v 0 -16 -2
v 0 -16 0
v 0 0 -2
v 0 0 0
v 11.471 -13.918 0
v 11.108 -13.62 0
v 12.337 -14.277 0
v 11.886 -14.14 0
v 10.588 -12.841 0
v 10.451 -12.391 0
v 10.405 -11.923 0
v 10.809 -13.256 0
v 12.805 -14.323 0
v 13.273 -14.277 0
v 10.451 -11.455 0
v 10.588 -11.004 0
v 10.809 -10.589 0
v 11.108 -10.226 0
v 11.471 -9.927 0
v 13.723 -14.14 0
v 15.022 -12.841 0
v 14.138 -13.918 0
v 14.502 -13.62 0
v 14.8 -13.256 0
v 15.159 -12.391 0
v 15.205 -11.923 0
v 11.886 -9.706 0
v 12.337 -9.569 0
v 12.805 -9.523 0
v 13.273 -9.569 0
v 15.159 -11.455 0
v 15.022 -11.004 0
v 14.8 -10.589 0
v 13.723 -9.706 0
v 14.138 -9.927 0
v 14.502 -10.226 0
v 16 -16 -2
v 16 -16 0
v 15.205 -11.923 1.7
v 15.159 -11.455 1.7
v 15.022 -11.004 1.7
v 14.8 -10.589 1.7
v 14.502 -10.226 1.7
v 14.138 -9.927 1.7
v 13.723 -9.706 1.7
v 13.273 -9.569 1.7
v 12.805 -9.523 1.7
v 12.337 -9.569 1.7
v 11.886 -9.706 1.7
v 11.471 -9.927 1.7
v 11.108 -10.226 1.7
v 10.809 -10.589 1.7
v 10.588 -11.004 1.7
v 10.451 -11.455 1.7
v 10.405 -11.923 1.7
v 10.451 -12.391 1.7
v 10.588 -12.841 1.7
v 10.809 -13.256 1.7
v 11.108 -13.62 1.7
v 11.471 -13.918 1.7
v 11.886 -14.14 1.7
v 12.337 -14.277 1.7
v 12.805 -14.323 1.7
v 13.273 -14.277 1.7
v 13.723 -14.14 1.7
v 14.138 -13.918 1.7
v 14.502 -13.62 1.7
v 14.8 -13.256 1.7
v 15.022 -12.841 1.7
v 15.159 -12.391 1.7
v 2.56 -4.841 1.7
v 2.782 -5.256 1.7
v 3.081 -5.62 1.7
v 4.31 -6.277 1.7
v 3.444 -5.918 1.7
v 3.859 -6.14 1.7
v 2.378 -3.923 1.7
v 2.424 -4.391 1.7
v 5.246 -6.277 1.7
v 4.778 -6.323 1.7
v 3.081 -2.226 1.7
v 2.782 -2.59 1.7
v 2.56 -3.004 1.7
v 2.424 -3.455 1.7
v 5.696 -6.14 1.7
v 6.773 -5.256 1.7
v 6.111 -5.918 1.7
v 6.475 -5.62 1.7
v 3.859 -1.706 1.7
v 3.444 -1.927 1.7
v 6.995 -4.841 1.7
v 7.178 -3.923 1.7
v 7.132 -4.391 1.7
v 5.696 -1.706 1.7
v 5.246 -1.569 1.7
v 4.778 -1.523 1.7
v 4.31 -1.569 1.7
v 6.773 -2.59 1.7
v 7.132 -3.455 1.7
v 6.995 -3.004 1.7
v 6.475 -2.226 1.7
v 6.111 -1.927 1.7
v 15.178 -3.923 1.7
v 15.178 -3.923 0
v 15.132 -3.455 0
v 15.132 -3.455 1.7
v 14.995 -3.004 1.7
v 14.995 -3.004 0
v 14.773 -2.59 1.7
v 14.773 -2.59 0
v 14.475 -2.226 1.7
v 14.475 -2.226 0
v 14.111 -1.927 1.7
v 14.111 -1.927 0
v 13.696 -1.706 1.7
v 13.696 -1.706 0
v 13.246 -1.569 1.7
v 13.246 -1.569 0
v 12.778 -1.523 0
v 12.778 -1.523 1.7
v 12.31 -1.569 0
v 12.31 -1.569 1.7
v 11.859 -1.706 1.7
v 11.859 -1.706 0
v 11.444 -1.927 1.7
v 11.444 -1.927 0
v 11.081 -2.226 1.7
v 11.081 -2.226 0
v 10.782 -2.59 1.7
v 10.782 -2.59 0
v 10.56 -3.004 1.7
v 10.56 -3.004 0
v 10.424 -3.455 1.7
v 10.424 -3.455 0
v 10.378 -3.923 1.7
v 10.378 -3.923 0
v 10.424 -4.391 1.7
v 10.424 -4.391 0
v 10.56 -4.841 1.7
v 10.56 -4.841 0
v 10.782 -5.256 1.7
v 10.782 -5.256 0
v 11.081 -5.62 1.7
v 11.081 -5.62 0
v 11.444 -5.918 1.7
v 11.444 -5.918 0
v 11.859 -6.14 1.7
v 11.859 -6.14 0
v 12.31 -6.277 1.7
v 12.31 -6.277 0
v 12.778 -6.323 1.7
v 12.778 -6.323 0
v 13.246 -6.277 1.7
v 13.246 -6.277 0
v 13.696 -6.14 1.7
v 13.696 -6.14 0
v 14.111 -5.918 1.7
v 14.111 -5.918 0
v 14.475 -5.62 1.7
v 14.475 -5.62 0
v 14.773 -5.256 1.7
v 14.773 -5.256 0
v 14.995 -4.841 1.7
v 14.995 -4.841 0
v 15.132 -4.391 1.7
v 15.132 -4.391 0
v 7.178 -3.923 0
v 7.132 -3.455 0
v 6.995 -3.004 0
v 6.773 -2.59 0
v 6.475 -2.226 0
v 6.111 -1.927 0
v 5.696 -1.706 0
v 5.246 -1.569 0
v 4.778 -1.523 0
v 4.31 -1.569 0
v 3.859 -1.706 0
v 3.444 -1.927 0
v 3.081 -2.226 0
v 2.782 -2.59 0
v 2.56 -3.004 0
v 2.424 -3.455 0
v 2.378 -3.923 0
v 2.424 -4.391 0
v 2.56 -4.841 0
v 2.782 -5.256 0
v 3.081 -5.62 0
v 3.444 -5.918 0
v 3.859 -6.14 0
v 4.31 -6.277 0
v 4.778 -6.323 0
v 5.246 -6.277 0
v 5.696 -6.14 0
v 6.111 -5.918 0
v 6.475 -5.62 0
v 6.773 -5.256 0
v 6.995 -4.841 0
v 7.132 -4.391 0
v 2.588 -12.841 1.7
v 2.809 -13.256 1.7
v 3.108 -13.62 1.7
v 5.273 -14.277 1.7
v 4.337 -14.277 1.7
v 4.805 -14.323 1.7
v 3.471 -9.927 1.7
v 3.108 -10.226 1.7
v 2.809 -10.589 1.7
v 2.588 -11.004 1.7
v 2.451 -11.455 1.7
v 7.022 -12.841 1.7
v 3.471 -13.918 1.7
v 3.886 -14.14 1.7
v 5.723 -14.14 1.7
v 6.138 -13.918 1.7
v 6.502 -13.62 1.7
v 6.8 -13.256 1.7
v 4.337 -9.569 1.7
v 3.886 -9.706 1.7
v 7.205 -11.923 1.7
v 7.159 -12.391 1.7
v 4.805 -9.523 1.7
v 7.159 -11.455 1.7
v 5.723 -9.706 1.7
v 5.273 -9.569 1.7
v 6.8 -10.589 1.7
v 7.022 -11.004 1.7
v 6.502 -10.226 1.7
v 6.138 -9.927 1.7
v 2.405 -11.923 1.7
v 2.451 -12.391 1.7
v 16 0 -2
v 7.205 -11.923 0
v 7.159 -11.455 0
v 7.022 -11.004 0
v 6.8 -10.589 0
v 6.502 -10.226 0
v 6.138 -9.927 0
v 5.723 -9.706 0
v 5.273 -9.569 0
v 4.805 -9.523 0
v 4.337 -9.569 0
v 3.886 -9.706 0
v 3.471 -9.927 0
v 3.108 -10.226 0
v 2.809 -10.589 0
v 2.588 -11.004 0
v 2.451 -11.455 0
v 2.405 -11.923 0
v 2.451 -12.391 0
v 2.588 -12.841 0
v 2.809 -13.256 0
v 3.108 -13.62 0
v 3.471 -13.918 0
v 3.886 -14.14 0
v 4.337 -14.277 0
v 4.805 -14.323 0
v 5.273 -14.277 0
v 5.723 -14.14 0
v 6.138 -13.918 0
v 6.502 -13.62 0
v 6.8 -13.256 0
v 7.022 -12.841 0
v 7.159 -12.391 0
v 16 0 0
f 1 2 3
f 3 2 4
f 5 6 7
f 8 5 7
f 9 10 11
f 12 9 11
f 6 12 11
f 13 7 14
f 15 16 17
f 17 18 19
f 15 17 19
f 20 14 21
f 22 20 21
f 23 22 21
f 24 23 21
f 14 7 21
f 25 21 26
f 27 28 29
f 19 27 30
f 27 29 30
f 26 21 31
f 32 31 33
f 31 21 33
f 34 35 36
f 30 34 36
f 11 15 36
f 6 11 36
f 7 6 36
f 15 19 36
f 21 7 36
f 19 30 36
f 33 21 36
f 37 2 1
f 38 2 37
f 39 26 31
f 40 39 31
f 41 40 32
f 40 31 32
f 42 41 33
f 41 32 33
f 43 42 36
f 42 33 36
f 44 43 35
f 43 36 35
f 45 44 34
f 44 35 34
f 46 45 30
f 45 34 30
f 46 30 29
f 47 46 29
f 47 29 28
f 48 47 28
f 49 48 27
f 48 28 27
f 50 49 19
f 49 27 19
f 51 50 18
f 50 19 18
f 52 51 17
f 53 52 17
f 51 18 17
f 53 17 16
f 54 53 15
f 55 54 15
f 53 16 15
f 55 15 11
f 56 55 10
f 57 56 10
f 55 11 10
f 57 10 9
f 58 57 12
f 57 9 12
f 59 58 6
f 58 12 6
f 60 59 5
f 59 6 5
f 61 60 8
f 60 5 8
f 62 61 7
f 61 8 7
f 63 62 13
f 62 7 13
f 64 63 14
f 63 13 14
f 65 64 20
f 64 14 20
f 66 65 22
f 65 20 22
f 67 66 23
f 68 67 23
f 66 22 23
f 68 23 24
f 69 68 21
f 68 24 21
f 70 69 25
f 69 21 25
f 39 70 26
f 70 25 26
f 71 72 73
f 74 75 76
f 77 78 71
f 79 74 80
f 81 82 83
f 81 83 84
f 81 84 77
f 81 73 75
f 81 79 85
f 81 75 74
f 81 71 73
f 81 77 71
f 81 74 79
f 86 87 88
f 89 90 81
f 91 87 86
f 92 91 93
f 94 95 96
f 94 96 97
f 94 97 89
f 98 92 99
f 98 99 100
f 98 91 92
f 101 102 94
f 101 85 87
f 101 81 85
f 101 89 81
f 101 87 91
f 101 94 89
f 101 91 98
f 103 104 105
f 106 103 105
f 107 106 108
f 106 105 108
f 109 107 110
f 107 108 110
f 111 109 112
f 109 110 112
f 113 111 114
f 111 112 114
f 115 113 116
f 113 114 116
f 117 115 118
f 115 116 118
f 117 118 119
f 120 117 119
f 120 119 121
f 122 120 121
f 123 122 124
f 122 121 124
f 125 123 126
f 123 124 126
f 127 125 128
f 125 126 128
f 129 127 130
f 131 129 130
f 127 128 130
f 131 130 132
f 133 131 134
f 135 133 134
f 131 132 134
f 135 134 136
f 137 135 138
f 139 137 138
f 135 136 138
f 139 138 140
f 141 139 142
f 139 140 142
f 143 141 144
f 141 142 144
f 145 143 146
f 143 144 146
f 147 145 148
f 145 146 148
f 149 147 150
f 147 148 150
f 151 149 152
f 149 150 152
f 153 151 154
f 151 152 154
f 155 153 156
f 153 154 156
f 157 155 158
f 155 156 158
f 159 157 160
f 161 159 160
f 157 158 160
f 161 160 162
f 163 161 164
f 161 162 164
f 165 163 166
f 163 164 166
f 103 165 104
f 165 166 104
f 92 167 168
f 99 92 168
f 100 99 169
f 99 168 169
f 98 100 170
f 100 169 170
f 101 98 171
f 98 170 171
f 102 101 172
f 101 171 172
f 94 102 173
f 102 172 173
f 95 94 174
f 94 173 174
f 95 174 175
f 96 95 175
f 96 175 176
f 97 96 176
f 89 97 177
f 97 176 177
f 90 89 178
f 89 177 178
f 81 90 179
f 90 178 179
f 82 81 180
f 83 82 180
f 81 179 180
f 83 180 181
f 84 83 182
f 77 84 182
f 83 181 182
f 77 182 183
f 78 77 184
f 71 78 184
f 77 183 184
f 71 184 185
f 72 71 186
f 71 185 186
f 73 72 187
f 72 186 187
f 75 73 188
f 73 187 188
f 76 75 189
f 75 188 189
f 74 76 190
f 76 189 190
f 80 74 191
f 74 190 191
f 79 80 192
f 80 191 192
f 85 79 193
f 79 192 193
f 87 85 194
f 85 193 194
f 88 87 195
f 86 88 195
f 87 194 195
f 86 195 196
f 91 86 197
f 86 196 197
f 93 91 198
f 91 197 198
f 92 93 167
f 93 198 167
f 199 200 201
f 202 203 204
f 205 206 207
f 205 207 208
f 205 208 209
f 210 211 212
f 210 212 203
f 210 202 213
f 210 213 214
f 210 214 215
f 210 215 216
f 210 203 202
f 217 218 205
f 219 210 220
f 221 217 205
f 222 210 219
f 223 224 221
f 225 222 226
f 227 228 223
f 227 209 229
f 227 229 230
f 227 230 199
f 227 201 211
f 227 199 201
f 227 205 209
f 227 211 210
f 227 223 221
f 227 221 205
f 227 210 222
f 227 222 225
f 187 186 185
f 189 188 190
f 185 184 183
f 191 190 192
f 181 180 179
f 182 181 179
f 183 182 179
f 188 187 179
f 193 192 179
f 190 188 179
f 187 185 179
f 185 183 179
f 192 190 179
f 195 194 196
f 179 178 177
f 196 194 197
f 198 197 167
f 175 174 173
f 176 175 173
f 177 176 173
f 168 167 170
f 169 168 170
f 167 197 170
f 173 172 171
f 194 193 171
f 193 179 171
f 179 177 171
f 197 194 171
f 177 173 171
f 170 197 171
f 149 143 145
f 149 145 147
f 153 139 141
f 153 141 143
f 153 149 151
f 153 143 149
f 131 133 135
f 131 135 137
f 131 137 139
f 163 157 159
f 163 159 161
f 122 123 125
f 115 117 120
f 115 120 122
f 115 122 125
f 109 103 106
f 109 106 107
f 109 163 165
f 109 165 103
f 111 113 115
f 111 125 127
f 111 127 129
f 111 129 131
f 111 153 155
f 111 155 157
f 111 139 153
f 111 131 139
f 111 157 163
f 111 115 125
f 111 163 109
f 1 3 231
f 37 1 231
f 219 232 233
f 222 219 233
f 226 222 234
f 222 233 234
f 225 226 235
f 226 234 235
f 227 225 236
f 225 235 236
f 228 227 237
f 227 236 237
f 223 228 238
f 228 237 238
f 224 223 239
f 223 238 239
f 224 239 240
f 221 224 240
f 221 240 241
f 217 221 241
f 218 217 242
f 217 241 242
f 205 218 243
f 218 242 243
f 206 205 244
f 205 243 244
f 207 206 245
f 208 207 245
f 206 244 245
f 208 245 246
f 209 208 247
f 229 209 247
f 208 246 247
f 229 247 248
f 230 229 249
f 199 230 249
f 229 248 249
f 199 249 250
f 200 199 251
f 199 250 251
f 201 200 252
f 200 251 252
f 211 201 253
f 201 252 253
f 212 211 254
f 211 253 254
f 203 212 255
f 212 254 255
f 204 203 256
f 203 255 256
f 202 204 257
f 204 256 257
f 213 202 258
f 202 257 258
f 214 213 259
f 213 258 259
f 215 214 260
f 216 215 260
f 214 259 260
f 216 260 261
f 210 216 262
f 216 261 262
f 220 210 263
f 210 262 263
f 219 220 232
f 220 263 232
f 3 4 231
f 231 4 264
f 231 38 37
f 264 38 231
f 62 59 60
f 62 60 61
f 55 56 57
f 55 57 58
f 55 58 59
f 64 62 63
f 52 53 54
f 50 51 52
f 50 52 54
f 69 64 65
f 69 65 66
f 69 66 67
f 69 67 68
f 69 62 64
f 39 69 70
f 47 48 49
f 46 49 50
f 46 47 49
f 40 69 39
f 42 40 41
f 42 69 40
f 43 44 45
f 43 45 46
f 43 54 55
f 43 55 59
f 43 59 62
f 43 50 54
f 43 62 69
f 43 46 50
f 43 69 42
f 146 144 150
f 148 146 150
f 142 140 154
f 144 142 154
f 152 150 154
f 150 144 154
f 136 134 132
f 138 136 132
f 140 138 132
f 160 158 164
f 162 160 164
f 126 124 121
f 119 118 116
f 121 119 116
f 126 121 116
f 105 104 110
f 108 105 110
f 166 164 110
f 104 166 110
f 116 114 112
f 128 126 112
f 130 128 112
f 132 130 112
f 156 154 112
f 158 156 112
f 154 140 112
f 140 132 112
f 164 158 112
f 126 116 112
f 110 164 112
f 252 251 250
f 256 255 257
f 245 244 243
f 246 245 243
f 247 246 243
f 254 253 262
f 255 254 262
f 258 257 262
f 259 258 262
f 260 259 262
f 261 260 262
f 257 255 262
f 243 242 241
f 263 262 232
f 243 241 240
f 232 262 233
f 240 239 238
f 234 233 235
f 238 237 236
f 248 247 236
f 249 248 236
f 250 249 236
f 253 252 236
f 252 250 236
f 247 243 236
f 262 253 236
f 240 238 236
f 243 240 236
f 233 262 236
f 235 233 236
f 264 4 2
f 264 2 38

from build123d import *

# Parameters (mm, degrees)
F0_R     = 2.4
F1_DEPTH = 1.7
F0_W     = 16
F0_H     = 16
F2_DEPTH = 2


with BuildPart() as f1:
    # F0 (on Top) → F1 (new body)
    with BuildSketch(Plane.XY):
        with Locations((12.804821, -11.922858)):
            Circle(F0_R)
        with Locations((12.777717, -3.922904)):
            Circle(F0_R)
        with Locations((4.777717, -3.922904)):
            Circle(F0_R)
        with Locations((4.804821, -11.922858)):
            Circle(F0_R)
    extrude(amount=F1_DEPTH)


with BuildPart() as f2:
    # F0 (on Top) → F2 (new body)
    with BuildSketch(Plane.XY):
        with Locations((8, -8)):
            Rectangle(F0_W, F0_H)
        with Locations((4.804821, -11.922858)):
            Circle(F0_R, mode=Mode.SUBTRACT)
        with Locations((12.804821, -11.922858)):
            Circle(F0_R, mode=Mode.SUBTRACT)
        with Locations((4.777717, -3.922904)):
            Circle(F0_R, mode=Mode.SUBTRACT)
        with Locations((12.777717, -3.922904)):
            Circle(F0_R, mode=Mode.SUBTRACT)
        with Locations((12.777717, -3.922904)):
            Circle(F0_R)
        with Locations((12.804821, -11.922858)):
            Circle(F0_R)
        with Locations((4.804821, -11.922858)):
            Circle(F0_R)
        with Locations((4.777717, -3.922904)):
            Circle(F0_R)
    extrude(amount=-F2_DEPTH)


solid = Compound([f1.part, f2.part])
